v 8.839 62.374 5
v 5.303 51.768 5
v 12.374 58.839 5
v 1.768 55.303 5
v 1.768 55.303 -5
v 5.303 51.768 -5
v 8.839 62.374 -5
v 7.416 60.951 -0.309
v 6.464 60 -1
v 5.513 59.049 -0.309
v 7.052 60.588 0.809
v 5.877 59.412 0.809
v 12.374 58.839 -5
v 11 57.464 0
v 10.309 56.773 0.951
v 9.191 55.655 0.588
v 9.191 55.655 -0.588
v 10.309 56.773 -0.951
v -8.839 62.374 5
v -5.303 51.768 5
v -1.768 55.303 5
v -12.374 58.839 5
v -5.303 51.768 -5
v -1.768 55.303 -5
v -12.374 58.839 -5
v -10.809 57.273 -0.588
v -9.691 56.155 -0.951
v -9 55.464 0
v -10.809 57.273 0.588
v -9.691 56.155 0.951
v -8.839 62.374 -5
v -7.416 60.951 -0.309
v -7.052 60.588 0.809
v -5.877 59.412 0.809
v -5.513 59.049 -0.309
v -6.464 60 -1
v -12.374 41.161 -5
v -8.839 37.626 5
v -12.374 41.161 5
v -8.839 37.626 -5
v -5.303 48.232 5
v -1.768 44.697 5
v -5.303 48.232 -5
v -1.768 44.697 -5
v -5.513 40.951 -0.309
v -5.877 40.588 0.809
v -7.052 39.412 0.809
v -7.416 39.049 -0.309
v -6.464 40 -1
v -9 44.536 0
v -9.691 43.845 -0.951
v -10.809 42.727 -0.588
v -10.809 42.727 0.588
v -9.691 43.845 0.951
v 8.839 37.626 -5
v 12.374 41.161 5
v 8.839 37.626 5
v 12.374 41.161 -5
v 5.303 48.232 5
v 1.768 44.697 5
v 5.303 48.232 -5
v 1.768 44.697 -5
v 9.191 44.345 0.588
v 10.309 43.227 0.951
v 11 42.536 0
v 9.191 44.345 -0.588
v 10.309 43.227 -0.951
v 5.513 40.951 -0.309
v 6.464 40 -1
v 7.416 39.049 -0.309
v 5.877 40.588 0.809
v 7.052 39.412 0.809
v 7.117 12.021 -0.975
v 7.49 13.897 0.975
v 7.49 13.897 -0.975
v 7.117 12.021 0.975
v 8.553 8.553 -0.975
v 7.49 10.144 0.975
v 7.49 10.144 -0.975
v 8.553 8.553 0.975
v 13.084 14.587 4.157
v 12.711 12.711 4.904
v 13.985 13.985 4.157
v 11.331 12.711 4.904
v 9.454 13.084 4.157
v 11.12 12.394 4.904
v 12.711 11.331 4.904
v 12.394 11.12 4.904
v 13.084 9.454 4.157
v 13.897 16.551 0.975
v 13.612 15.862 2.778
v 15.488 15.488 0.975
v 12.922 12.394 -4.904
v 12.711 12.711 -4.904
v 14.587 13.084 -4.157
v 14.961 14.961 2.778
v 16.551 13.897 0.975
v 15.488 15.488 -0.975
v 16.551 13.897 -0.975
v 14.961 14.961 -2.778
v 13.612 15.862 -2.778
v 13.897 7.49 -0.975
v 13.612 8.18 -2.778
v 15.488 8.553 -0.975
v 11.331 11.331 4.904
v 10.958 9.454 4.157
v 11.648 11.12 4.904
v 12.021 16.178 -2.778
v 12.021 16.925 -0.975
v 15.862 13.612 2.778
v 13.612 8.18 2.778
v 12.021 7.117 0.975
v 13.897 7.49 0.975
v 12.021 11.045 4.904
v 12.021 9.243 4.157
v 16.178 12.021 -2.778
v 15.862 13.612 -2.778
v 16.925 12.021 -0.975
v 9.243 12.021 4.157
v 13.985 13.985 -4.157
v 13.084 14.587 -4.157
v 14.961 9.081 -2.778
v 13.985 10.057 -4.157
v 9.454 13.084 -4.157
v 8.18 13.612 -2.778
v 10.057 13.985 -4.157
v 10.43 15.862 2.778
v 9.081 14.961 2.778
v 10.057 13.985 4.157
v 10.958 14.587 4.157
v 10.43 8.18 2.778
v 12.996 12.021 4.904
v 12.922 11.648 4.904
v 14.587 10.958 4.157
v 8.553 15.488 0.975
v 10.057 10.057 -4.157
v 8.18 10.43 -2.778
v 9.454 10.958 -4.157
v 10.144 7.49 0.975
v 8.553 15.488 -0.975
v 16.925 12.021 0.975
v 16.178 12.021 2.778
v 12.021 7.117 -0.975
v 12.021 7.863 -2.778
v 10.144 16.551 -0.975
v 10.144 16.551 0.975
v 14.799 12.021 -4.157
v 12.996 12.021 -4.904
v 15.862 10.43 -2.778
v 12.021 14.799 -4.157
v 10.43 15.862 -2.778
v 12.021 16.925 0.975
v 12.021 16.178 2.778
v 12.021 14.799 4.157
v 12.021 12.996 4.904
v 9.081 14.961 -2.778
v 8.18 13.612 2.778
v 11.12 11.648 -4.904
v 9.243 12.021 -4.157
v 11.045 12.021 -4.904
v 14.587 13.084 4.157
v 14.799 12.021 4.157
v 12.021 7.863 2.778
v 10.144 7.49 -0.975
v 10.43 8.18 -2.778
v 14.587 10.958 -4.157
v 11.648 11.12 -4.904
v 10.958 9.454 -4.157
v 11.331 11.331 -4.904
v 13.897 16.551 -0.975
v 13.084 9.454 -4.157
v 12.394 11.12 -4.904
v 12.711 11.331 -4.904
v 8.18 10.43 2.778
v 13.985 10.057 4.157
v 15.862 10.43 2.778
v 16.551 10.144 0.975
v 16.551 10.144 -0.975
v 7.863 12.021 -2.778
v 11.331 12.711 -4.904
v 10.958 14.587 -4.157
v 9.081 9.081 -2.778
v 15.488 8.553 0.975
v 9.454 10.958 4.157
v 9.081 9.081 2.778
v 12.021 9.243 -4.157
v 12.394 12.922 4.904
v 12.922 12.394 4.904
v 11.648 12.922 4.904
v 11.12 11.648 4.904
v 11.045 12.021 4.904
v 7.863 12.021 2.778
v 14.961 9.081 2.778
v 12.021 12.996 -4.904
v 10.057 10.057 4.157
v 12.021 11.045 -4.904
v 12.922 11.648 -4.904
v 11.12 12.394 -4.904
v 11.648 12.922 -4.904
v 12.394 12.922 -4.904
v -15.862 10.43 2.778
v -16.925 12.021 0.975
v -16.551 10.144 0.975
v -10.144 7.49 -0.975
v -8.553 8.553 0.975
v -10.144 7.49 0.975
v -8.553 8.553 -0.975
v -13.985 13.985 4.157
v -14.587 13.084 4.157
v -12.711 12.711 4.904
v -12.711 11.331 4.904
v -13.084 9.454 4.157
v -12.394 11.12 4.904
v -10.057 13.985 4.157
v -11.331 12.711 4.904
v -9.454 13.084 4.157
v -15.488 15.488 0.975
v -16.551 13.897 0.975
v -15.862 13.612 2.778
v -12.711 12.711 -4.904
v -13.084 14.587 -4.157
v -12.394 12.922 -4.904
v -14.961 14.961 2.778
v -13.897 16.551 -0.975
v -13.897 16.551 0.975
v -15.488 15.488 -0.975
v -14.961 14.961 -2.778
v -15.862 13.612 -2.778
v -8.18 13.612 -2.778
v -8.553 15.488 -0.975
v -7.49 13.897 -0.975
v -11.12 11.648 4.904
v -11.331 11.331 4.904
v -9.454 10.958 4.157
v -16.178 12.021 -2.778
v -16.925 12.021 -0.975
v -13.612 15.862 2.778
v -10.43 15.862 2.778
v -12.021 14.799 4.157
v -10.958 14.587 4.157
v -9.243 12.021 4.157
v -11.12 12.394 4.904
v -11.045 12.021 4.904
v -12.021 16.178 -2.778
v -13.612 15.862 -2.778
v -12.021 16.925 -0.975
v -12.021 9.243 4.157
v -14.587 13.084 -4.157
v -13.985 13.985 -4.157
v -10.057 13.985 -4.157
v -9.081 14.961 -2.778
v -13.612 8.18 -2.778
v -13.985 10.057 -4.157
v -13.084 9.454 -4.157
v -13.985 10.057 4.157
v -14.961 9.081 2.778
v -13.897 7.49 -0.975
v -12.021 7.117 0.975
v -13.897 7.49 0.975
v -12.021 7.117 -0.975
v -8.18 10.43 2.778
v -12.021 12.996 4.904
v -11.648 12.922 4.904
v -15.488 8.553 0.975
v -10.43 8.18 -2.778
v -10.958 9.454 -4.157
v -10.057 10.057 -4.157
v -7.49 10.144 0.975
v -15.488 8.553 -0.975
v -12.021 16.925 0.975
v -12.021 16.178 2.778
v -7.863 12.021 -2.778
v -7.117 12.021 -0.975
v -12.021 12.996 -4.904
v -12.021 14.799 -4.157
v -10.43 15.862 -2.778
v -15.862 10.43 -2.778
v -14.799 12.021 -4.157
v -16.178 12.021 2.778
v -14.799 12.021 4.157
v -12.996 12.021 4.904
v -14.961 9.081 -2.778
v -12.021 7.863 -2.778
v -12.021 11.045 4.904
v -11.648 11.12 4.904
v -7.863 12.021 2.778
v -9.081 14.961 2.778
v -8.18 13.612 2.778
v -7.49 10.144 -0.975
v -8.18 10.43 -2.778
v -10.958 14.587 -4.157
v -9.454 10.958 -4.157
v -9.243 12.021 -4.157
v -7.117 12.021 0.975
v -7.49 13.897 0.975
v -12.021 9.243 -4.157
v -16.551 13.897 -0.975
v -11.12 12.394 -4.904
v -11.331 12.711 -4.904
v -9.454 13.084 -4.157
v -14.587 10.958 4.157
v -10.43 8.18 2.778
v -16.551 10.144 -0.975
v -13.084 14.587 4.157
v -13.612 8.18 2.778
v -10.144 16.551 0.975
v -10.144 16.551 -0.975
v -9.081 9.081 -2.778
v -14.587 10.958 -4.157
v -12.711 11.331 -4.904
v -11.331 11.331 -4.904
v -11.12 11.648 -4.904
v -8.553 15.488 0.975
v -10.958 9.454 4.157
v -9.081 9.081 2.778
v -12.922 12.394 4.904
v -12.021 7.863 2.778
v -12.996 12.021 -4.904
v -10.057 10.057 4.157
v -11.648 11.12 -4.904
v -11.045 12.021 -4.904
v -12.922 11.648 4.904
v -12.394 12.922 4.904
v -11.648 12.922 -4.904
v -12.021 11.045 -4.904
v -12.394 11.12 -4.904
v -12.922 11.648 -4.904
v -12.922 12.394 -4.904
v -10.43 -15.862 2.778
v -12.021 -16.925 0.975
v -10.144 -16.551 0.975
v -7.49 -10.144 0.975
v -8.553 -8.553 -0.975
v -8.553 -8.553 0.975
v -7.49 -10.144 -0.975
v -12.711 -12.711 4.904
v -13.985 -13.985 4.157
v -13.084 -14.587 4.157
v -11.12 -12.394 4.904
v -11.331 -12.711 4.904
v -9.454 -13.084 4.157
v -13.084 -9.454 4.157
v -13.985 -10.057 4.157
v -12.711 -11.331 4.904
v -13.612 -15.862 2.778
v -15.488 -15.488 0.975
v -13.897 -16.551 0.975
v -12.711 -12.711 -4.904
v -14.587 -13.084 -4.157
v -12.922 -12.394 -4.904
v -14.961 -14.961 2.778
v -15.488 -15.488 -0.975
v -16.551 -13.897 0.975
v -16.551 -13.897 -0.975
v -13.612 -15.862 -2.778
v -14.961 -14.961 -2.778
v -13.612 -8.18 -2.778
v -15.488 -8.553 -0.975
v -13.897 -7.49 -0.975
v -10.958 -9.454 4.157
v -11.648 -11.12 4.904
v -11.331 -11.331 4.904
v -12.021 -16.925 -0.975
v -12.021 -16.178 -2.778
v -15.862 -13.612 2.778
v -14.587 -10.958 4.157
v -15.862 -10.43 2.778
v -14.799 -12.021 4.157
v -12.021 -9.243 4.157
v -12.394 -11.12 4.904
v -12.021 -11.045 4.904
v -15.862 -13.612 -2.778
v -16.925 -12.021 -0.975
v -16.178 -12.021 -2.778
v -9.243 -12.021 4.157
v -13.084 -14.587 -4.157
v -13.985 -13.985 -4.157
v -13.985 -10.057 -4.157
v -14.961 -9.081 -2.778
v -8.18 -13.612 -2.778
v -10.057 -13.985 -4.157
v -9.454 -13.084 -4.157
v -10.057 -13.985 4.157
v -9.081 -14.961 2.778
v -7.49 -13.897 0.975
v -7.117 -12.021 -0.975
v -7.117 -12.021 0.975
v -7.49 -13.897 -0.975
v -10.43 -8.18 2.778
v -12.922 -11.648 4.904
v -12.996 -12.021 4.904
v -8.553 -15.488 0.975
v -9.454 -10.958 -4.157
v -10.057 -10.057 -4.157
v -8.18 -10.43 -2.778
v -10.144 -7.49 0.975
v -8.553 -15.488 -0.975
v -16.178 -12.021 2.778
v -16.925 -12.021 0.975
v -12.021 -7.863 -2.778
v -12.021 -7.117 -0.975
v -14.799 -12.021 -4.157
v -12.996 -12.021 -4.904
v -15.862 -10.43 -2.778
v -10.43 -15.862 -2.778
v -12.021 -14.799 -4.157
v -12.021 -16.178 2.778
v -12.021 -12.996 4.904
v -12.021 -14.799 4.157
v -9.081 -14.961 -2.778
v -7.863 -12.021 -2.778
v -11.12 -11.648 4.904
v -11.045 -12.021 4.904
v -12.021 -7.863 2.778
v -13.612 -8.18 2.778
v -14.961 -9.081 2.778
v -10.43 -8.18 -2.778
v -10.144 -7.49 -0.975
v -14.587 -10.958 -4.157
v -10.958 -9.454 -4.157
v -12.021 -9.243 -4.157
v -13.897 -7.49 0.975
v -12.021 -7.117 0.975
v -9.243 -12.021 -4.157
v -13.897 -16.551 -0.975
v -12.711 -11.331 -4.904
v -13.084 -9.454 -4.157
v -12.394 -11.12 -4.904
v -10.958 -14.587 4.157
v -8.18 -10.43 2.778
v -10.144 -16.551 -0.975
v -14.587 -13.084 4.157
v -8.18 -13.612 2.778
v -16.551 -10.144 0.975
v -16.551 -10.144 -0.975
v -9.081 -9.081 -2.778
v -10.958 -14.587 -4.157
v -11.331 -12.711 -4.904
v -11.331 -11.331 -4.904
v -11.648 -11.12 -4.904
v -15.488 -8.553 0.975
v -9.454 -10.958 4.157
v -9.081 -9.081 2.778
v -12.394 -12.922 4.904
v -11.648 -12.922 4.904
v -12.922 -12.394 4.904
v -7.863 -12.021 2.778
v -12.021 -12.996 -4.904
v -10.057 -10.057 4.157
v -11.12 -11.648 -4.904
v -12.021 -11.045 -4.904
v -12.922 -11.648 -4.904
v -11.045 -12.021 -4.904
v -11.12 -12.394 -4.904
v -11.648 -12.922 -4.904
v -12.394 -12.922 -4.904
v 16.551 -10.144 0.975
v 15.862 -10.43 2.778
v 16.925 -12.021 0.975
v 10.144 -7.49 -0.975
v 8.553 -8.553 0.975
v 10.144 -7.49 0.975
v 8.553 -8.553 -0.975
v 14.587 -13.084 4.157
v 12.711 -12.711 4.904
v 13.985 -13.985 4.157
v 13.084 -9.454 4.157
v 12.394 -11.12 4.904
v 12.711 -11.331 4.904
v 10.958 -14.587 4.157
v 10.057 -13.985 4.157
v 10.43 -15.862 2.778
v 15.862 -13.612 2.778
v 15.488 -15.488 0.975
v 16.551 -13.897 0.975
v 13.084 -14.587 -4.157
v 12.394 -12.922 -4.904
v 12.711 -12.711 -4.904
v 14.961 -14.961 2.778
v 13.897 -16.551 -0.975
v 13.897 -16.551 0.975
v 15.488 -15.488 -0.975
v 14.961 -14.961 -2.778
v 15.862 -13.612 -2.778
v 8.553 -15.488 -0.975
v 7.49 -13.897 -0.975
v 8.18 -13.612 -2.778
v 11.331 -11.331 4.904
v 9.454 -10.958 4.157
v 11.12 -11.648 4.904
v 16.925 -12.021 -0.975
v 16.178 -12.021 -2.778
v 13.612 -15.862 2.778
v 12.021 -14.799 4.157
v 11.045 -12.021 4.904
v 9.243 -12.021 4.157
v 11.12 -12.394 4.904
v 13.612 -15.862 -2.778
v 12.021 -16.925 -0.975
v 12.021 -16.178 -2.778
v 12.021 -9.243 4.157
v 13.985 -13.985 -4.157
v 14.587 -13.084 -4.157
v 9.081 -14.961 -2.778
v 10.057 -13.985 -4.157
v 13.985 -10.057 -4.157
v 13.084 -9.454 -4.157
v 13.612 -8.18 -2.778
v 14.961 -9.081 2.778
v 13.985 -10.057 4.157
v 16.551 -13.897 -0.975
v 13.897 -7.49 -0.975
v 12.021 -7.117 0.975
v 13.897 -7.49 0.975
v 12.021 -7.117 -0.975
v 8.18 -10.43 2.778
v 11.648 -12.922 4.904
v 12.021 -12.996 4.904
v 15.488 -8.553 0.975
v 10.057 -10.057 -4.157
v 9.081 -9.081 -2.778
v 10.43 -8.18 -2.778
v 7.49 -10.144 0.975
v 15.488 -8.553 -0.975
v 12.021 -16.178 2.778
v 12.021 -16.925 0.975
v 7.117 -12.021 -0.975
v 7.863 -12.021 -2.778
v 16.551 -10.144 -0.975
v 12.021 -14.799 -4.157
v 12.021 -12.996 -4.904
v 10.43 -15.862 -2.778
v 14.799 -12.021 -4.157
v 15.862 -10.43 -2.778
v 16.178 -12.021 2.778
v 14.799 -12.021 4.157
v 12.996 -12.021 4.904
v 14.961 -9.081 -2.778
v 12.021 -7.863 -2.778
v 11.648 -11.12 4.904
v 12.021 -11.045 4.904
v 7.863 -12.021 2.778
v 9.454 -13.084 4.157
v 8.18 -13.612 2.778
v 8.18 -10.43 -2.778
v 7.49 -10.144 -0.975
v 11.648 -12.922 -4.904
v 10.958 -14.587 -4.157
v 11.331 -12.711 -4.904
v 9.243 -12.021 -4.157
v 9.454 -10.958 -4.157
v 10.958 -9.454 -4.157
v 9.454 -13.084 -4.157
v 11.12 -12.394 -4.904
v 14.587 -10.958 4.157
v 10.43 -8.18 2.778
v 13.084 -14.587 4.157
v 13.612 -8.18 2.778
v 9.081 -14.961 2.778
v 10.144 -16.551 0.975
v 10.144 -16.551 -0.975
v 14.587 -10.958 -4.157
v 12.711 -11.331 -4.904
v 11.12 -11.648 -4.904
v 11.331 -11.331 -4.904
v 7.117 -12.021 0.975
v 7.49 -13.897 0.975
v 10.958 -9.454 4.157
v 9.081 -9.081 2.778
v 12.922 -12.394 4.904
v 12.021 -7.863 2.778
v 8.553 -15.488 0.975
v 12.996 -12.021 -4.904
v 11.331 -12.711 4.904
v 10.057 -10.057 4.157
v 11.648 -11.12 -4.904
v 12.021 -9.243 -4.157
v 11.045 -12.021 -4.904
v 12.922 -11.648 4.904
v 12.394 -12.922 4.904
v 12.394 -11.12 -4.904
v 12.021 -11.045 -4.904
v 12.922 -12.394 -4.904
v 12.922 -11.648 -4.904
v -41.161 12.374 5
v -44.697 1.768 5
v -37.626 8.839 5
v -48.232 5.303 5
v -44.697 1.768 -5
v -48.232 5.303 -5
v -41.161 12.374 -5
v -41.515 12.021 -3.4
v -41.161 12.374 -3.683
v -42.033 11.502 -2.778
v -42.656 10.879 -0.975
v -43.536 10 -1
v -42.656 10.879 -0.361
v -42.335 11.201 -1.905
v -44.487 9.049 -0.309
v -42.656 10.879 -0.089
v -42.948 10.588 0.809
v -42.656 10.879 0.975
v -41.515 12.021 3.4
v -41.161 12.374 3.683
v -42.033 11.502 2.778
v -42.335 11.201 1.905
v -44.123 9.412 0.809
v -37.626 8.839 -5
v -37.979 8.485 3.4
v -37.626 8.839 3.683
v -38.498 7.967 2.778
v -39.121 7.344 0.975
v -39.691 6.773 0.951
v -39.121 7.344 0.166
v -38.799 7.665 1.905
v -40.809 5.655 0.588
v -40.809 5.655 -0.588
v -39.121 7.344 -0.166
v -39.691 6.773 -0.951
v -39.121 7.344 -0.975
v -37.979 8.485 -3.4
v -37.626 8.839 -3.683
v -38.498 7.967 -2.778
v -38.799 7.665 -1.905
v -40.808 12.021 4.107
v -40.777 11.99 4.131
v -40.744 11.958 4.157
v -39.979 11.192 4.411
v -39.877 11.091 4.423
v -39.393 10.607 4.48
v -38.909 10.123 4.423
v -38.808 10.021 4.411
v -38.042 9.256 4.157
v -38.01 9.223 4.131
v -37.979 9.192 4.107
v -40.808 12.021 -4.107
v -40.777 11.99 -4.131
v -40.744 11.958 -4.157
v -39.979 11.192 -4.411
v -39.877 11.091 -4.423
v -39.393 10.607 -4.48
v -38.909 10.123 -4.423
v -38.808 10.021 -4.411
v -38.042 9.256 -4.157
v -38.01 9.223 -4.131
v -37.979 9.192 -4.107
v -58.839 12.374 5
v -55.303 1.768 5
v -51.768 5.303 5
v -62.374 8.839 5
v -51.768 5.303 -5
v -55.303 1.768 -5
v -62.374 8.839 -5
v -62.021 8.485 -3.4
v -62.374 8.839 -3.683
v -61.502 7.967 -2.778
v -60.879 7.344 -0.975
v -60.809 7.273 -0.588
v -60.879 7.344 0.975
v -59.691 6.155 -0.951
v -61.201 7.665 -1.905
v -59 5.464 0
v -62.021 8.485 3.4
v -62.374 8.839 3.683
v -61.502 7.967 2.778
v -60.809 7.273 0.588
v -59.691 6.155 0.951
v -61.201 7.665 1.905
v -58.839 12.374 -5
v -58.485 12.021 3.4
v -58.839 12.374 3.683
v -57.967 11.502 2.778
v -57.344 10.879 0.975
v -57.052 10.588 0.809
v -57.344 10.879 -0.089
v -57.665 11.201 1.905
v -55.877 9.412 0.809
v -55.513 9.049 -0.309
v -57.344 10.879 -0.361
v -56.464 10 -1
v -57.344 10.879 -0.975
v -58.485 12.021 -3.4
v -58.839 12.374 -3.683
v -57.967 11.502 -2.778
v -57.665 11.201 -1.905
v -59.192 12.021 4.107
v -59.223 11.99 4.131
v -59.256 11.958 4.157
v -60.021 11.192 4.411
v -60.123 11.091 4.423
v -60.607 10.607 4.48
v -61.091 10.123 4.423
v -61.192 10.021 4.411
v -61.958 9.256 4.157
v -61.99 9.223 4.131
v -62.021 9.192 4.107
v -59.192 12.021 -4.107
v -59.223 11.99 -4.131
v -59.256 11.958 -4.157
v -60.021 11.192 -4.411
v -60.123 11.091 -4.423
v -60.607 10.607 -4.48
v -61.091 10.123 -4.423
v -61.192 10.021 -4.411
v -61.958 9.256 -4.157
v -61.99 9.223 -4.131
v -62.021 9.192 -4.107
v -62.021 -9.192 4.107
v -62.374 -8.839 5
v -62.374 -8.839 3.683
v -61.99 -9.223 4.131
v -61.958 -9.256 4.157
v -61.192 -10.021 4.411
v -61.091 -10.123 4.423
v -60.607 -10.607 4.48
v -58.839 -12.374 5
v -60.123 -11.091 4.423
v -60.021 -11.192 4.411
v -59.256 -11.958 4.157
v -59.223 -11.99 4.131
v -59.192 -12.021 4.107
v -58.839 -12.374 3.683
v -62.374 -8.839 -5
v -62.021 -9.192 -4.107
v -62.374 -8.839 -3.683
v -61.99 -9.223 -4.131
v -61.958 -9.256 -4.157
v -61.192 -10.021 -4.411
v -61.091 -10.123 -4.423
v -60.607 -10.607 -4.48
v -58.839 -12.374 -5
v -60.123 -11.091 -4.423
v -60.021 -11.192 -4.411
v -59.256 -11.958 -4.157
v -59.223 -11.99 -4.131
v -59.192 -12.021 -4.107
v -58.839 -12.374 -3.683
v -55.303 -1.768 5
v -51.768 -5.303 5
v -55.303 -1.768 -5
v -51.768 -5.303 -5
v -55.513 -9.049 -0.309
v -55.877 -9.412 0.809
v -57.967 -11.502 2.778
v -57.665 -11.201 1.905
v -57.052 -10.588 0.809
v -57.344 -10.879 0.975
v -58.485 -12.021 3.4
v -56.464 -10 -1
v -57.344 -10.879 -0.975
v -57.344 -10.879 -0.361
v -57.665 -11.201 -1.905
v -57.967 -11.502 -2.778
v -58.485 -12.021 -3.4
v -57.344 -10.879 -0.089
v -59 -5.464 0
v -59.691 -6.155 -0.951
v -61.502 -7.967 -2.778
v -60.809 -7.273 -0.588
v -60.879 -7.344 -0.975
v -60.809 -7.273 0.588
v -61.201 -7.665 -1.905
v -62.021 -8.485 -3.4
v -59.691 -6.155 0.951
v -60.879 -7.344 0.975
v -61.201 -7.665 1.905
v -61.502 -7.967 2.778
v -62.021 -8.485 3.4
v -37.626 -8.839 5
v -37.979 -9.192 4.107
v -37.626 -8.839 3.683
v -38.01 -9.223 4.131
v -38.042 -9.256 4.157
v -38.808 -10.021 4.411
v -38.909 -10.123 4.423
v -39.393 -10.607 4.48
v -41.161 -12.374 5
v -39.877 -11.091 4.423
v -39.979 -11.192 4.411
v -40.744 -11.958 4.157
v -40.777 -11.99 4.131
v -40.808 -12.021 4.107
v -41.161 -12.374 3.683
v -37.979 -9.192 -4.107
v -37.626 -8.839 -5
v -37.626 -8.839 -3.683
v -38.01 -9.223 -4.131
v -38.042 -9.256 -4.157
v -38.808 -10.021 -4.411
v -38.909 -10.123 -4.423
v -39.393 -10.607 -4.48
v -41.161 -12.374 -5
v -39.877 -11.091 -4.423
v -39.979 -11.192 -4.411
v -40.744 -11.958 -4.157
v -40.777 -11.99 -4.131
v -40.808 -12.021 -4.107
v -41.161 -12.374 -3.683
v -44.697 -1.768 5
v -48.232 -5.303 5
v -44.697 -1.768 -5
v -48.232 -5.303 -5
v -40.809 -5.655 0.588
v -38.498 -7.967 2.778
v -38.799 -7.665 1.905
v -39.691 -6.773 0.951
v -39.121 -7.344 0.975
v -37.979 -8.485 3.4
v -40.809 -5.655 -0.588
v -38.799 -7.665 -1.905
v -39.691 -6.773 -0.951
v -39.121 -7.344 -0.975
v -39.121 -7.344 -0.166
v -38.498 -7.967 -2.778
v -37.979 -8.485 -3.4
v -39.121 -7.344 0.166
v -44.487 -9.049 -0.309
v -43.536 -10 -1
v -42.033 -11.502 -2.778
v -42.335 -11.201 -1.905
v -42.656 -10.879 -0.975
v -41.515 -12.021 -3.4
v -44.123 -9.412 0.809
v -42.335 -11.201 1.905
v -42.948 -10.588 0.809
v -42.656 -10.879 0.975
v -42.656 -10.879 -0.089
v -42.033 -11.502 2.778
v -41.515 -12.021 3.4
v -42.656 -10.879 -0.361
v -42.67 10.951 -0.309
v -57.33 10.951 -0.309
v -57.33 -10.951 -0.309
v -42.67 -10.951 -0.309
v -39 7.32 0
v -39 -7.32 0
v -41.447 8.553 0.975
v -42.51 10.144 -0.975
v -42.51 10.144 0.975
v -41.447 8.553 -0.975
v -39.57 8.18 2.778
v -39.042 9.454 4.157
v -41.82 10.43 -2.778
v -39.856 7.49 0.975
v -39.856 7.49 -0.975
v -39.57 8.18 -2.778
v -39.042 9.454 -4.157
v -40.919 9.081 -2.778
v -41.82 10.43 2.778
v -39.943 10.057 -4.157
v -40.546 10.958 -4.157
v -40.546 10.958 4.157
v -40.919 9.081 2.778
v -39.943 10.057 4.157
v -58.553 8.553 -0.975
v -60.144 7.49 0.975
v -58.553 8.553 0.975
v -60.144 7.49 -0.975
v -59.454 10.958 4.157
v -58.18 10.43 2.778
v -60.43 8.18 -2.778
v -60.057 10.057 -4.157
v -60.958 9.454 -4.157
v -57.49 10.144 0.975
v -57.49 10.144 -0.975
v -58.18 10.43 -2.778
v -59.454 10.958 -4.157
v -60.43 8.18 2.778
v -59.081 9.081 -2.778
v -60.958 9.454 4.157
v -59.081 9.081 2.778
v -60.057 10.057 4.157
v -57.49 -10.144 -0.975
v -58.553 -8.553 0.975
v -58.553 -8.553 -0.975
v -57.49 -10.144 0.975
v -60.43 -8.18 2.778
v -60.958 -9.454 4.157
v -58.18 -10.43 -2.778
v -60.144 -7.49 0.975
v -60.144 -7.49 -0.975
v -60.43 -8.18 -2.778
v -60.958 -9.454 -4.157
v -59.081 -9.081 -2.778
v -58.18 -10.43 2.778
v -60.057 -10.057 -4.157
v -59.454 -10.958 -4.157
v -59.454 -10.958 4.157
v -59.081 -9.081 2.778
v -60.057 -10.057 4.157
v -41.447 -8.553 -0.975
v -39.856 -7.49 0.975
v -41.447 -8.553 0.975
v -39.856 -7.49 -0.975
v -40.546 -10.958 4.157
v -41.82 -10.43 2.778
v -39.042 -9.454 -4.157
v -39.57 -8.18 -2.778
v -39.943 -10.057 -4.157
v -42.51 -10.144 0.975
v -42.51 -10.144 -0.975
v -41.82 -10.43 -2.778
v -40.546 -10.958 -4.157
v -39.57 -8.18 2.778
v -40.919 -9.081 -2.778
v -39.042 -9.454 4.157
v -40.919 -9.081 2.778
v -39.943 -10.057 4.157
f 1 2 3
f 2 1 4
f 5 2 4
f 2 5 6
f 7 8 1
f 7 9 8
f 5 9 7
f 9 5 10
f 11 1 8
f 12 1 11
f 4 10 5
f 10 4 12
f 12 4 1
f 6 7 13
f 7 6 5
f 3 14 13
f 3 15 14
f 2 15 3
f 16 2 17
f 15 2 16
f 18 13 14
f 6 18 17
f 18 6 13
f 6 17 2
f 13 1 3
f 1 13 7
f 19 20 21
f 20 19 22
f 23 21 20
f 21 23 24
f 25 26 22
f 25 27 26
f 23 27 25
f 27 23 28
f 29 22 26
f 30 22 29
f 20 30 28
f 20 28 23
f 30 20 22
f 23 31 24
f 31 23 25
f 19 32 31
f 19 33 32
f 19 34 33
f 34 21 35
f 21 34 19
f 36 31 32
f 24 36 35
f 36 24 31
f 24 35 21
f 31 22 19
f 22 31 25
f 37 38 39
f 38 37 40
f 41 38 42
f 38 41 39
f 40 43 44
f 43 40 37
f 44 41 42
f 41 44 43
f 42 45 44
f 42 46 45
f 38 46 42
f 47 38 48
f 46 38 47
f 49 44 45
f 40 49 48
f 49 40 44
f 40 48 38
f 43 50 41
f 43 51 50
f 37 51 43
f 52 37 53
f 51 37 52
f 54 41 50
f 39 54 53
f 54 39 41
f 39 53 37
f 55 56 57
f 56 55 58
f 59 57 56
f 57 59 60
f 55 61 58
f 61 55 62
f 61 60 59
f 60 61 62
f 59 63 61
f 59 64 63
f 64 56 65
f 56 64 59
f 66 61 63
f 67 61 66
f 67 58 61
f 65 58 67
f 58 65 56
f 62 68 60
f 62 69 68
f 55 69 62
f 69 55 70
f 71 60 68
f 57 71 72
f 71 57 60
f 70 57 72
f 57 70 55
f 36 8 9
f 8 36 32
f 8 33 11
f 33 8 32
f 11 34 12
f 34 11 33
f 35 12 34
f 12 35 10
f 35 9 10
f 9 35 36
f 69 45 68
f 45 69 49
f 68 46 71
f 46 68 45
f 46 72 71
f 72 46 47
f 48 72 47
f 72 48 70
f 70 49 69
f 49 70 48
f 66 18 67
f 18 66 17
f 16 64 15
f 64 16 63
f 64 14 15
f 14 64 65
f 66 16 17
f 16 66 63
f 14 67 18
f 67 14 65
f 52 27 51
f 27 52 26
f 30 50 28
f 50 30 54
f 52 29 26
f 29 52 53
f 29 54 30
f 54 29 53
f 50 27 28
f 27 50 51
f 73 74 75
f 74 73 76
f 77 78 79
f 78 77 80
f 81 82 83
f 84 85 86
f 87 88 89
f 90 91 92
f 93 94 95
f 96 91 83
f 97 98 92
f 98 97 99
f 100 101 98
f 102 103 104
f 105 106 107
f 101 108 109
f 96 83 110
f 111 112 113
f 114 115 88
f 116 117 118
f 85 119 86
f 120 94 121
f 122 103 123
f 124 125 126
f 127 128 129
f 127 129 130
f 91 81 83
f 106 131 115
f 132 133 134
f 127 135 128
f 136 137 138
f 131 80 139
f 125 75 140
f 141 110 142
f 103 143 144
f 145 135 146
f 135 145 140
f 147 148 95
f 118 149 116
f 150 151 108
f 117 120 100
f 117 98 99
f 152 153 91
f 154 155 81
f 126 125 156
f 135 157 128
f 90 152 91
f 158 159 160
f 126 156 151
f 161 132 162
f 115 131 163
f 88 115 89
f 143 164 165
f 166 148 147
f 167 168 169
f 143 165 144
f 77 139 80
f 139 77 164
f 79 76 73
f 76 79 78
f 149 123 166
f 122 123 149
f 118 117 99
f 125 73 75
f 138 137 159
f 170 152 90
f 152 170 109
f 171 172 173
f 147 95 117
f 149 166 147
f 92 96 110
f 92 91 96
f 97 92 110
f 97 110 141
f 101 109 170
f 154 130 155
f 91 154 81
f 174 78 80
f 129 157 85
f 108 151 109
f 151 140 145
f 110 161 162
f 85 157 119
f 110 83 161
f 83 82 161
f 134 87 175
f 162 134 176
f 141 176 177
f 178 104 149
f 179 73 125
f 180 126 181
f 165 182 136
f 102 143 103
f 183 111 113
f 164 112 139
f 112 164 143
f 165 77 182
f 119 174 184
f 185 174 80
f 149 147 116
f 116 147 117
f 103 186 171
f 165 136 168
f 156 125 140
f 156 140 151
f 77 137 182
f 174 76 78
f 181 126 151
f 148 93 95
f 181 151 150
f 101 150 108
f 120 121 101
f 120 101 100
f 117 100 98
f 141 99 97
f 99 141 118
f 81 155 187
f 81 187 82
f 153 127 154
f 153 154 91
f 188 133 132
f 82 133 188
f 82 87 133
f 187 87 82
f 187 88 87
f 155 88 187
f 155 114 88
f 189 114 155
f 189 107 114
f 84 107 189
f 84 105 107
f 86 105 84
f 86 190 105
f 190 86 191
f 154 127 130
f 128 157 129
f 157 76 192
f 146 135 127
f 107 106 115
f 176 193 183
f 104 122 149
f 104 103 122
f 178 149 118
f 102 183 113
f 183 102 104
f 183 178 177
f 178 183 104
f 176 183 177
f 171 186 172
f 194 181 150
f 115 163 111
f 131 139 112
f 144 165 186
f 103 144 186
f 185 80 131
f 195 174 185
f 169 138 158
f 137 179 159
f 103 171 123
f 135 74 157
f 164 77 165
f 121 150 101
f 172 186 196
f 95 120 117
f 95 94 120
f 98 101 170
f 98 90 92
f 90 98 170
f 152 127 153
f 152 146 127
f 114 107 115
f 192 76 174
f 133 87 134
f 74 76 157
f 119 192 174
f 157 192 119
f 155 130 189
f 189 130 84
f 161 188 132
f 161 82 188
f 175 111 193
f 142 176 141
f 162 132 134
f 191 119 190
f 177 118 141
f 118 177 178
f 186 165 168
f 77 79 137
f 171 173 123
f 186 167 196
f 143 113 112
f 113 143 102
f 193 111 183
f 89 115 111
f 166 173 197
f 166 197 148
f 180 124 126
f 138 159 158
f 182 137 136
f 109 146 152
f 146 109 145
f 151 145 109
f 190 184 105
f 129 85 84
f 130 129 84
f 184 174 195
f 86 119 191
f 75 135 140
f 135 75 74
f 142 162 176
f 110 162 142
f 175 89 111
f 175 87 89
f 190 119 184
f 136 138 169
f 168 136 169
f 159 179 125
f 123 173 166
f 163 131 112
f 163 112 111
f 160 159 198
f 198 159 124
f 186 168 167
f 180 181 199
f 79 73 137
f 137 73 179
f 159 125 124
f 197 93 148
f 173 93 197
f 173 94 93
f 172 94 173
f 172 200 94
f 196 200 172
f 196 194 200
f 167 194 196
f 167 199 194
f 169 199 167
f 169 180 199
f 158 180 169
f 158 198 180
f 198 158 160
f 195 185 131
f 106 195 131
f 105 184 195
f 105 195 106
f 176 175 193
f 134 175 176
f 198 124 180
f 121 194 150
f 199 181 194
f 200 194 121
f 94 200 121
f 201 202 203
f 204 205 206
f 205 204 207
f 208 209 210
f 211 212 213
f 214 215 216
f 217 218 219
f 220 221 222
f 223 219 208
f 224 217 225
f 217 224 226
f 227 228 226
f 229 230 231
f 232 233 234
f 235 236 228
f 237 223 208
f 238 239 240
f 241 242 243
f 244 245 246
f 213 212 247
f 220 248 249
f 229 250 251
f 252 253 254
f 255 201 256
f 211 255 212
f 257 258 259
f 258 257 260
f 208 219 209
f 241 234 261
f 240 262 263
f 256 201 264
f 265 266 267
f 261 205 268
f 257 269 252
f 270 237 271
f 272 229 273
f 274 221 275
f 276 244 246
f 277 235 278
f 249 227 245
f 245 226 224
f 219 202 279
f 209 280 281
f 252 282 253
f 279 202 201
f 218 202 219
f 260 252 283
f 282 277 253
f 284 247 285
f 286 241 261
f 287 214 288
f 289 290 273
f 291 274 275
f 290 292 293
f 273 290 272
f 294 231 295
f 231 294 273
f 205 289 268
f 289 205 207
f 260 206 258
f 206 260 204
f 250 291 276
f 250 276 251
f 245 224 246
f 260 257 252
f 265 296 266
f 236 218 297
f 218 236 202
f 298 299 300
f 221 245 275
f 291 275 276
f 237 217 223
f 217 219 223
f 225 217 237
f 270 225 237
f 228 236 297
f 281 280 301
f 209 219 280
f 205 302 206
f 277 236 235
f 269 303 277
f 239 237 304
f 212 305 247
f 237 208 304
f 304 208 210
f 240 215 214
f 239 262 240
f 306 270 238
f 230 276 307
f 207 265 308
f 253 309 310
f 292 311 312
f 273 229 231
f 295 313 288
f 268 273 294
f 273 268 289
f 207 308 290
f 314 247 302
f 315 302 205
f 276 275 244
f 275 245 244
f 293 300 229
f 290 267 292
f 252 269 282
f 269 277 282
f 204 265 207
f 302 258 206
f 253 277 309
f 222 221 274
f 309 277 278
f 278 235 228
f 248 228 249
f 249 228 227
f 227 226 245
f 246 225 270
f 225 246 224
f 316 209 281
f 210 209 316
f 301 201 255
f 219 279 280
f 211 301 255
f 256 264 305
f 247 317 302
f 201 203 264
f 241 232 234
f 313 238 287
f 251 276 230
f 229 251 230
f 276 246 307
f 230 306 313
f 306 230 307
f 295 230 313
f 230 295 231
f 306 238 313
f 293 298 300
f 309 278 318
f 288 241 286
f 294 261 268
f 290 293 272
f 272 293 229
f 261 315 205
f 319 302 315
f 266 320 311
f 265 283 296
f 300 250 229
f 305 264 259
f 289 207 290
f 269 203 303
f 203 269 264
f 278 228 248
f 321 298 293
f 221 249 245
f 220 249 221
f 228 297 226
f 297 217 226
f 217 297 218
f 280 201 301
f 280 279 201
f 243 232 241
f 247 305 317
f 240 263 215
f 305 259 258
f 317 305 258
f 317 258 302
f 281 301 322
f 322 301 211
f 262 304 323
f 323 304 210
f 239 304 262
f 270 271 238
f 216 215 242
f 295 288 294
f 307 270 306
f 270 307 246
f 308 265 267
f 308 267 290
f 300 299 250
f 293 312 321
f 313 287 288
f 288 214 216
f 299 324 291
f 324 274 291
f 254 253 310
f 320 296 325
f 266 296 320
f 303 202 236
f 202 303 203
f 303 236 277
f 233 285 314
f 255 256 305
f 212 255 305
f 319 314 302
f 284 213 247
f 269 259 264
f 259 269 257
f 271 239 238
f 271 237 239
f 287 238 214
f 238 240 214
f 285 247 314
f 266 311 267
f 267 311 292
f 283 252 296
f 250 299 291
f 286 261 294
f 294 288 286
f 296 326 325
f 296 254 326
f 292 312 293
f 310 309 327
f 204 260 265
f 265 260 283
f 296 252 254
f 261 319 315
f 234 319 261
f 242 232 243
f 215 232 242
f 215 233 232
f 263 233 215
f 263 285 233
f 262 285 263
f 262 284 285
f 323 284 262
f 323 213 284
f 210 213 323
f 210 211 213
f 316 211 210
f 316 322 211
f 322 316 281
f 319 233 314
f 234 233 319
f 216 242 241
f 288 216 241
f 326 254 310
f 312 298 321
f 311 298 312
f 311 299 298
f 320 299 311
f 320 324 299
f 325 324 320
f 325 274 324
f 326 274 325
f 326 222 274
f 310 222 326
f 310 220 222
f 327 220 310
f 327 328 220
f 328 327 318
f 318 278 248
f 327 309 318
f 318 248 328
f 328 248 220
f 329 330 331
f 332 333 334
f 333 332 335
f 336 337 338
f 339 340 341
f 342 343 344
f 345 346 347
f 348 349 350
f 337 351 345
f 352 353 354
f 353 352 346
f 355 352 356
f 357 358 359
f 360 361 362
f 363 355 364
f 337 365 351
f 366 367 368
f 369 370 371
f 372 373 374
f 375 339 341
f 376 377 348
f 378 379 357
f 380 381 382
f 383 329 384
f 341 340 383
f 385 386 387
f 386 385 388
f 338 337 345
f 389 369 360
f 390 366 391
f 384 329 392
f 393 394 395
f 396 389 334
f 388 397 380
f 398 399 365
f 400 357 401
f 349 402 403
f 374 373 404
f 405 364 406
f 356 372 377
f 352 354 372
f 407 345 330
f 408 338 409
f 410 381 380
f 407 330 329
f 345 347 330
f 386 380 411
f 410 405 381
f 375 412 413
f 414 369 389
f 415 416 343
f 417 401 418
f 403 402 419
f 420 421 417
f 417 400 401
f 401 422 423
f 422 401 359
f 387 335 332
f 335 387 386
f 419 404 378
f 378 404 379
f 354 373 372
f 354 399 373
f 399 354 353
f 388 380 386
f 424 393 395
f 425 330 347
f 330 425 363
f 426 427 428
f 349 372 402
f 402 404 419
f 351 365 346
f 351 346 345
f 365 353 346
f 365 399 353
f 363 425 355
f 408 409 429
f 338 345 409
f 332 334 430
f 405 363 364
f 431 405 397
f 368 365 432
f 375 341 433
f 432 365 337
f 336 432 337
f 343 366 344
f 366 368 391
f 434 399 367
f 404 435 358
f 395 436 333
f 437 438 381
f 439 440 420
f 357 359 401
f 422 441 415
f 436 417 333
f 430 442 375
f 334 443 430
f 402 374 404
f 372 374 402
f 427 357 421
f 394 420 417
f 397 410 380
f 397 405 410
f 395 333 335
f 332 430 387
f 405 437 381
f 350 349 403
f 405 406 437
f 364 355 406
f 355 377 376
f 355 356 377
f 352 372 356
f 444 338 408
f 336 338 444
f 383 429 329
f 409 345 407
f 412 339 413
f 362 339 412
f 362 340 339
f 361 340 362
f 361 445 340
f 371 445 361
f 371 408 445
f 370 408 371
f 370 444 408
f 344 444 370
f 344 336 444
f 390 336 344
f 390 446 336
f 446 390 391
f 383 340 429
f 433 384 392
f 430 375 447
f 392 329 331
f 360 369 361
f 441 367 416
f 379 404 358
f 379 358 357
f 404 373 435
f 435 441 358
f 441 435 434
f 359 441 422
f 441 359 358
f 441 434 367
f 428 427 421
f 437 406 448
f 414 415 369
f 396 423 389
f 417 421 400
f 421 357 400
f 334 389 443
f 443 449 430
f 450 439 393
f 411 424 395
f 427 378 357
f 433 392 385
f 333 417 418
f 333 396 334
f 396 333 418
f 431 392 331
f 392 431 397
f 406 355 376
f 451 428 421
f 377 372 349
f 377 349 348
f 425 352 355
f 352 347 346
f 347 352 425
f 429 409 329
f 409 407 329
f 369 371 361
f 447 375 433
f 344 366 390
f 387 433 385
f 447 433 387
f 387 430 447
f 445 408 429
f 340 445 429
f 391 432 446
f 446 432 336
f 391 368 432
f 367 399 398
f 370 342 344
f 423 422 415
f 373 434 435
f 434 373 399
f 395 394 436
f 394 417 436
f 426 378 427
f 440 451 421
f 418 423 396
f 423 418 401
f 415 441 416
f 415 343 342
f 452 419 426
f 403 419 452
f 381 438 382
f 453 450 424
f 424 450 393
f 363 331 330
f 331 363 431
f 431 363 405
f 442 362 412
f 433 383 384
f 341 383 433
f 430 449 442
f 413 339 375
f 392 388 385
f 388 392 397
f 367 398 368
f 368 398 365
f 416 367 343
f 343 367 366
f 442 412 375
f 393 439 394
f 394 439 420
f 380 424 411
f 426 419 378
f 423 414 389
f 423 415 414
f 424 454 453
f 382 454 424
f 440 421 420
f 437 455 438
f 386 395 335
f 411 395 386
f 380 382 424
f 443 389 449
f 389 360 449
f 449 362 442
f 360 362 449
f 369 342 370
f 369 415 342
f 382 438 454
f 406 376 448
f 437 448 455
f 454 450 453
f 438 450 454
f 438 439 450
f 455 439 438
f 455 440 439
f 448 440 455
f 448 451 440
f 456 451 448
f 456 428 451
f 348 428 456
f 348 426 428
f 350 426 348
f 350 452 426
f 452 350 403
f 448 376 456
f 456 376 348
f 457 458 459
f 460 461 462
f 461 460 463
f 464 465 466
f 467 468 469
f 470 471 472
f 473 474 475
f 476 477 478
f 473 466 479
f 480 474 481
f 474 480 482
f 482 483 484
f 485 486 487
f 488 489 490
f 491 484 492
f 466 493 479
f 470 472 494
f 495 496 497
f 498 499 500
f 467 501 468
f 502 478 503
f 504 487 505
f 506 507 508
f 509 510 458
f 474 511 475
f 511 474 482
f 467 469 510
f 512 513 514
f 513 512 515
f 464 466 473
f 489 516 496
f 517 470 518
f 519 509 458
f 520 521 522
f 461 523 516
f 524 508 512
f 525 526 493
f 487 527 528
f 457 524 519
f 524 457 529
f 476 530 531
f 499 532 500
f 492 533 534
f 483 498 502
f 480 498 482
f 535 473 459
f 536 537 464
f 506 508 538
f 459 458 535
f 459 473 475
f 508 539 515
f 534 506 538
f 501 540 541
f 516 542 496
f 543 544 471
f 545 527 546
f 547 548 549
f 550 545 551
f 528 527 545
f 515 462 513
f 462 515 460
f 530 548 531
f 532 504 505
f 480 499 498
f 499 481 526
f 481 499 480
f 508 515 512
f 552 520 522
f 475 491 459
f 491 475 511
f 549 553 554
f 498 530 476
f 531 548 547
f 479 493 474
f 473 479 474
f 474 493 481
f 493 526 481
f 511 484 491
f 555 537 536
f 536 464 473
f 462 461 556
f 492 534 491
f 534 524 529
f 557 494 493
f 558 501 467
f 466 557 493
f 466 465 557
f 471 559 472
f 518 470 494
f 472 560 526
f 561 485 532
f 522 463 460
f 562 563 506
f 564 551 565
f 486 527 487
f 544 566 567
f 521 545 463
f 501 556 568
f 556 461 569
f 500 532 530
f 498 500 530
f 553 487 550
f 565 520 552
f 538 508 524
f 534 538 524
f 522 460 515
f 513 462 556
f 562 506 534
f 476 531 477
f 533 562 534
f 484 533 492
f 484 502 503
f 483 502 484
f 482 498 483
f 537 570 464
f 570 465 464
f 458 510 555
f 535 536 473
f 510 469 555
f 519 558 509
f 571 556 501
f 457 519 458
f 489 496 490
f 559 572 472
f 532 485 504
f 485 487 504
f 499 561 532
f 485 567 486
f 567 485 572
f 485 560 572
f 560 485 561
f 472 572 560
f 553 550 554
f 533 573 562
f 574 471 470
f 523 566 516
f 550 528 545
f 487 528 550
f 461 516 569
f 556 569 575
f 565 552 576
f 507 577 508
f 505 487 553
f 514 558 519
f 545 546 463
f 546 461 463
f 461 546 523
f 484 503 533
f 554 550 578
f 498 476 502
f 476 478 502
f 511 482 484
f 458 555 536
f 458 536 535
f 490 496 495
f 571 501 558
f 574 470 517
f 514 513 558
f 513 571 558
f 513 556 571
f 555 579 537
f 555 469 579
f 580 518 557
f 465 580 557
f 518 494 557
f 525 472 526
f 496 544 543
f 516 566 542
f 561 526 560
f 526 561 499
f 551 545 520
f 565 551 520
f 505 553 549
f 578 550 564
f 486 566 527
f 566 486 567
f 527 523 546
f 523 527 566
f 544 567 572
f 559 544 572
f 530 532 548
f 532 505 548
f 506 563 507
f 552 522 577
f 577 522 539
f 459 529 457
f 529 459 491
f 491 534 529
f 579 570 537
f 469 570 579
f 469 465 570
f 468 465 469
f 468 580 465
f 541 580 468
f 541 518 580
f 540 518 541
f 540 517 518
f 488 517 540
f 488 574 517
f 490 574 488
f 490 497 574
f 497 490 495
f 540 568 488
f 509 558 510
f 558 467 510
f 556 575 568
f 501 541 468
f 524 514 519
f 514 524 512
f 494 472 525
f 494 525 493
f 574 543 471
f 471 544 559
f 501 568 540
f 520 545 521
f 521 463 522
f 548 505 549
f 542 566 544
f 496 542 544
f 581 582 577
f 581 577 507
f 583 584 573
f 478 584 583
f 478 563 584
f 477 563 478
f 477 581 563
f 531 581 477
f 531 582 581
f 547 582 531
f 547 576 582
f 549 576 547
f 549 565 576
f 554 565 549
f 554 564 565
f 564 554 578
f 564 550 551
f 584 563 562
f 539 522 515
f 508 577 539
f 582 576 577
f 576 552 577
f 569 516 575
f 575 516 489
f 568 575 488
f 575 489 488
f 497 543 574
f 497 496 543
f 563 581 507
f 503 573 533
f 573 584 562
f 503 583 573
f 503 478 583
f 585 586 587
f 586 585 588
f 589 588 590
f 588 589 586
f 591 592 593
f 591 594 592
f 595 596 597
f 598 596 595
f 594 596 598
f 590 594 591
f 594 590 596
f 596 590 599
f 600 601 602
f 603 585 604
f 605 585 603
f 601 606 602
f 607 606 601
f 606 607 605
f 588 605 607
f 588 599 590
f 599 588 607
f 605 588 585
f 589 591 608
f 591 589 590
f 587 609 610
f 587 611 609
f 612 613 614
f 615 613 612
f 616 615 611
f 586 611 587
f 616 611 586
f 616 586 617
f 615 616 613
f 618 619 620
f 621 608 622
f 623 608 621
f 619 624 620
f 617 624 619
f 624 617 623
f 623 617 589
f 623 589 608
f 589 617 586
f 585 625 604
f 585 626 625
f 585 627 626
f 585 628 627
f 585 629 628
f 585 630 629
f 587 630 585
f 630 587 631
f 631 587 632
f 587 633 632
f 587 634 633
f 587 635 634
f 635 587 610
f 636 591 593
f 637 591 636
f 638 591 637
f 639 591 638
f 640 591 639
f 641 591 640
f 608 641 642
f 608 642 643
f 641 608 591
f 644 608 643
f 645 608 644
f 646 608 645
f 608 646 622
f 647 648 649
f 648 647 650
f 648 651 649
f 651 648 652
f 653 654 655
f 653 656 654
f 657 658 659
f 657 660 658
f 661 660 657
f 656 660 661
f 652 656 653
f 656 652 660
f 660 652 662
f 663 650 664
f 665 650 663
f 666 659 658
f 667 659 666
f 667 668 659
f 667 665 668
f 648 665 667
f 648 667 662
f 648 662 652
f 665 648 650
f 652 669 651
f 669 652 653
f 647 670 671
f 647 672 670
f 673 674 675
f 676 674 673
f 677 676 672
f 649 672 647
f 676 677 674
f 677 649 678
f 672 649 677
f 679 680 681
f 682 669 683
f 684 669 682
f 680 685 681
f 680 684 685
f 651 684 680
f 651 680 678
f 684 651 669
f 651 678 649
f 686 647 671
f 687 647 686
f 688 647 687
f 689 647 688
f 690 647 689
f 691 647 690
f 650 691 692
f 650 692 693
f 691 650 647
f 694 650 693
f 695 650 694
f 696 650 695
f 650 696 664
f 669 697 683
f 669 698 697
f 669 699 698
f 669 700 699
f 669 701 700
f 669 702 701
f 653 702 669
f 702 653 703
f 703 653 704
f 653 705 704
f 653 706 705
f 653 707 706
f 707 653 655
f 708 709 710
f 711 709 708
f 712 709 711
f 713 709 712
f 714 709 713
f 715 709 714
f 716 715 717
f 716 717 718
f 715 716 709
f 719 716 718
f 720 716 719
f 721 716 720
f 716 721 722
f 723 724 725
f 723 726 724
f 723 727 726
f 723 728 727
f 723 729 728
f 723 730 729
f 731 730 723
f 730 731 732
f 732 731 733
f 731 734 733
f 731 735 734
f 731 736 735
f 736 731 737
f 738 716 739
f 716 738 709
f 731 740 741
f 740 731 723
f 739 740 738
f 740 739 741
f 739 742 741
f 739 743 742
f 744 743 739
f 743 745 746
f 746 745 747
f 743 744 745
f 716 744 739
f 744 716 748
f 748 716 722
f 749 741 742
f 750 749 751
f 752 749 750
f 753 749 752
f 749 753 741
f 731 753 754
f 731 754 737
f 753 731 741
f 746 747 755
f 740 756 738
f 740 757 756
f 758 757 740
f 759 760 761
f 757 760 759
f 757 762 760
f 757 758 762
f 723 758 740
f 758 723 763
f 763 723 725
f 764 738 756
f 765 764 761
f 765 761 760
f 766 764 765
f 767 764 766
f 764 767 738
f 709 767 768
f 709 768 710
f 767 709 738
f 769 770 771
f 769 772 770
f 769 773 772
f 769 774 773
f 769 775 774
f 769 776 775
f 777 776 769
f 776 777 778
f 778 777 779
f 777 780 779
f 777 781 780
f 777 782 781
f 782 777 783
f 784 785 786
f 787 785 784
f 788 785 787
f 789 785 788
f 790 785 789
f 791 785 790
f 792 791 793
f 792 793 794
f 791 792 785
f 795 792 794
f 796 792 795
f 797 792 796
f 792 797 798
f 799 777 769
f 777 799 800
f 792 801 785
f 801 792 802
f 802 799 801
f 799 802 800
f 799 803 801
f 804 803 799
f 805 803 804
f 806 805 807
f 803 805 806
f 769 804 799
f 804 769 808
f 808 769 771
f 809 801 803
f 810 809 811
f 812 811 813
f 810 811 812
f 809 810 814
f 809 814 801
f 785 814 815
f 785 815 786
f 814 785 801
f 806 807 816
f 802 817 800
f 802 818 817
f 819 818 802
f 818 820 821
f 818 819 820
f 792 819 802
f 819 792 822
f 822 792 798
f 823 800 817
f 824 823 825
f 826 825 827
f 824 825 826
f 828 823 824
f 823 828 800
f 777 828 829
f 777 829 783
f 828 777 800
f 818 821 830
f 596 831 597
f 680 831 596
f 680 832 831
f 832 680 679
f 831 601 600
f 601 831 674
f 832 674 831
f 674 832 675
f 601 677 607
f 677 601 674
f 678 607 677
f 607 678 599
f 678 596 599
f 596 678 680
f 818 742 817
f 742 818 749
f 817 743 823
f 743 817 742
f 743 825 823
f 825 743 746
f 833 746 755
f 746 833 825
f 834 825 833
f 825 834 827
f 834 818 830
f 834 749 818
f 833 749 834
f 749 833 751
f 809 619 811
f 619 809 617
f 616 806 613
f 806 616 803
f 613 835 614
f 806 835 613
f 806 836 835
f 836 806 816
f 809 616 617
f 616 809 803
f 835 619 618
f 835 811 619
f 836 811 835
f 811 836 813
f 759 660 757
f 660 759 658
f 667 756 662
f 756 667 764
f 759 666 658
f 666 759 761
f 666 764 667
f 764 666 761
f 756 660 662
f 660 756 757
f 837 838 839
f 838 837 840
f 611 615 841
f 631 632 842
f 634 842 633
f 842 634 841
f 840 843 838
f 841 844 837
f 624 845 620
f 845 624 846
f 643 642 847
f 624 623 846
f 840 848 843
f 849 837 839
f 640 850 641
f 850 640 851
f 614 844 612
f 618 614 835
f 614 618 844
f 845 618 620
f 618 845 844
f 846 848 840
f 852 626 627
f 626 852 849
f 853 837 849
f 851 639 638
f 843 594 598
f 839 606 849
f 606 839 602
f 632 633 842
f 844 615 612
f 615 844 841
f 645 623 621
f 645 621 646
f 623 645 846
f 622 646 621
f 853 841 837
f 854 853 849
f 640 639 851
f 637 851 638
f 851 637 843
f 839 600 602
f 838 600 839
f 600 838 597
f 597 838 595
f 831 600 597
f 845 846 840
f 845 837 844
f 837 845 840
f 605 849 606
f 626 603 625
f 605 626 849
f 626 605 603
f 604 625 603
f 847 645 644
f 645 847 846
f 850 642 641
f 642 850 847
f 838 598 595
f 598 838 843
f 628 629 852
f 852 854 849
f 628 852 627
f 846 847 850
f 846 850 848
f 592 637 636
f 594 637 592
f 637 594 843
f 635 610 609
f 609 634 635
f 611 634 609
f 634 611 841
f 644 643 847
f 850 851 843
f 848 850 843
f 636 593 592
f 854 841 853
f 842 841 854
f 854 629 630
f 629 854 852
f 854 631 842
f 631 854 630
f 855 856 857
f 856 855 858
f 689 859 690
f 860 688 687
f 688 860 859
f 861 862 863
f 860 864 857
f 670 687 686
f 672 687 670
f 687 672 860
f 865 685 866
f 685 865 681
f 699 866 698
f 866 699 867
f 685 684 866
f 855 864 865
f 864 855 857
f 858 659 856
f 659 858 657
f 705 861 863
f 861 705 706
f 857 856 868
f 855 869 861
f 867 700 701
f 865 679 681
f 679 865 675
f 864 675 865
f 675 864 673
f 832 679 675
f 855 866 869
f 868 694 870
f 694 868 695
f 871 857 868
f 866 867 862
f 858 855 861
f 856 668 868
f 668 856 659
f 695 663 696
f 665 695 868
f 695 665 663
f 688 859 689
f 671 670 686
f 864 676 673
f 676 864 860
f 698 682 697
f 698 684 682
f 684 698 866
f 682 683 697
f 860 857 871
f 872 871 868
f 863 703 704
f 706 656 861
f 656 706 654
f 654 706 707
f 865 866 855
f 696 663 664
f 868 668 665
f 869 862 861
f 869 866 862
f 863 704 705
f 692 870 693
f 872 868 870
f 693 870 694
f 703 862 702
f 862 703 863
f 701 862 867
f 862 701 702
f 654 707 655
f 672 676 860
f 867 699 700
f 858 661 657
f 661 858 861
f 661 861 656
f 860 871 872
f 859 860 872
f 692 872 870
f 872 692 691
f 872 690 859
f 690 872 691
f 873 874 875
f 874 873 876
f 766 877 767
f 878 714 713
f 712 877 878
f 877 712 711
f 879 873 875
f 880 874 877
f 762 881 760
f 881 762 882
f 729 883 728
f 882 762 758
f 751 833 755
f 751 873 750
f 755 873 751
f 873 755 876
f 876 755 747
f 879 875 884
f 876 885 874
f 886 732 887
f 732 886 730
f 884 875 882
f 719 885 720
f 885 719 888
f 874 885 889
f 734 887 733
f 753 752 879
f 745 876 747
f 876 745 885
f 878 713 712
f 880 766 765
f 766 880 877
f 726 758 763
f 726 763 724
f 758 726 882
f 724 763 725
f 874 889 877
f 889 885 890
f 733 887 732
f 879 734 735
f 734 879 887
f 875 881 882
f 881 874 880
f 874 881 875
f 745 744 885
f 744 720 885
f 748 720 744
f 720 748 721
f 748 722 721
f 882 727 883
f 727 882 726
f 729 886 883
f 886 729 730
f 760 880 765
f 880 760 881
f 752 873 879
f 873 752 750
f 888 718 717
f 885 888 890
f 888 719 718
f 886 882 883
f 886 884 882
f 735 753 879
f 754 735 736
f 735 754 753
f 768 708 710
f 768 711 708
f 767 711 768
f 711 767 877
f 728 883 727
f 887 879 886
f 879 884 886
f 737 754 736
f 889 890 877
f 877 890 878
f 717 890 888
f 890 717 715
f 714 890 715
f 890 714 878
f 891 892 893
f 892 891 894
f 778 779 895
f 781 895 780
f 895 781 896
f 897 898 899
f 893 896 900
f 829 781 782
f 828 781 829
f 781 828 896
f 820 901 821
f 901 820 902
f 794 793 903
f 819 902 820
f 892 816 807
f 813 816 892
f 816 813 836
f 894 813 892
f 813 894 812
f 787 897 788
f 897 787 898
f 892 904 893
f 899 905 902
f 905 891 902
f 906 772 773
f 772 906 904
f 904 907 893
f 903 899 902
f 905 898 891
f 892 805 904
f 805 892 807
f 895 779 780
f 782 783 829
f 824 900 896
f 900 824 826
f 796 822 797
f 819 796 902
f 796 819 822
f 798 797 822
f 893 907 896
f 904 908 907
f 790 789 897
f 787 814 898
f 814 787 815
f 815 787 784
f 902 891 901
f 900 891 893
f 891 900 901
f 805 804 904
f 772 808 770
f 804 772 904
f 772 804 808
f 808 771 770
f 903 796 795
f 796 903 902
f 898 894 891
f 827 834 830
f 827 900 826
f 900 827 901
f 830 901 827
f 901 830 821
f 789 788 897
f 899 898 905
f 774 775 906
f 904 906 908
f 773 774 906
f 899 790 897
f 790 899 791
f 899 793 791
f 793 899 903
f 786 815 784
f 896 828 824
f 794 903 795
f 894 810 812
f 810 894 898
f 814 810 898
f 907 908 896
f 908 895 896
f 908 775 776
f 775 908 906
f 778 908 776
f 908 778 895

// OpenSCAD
b=10;
h=5;
a=10;
radio=5;
resta=1;

// **************ENSAMBLE*****************

translate([0,50,0])
union(){
    //Figura1
rotate(45)
translate([b,0,0])
cube([b,h,10],center=true);

    //Figura2
rotate(135)
translate([b,0,0])
cube([b,h,10],center=true);
    
    //Figura3
rotate(225)
translate([b,0,0])
cube([b,h,10],center=true);

    //Figura4
rotate(315)
translate([b,0,0])
cube([b,h,10],center=true);

    //Union1
translate([0,b,0])
rotate([0,90,0])
cylinder(r=1,Sfn=5,h=2*b,center=true);

    //Union2
translate([0,-b,0])
rotate([0,90,0])
cylinder(r=1,Sfn=5,h=2*b,center=true);

    //Union3
translate([b,0,0])
rotate([90,0,0])
cylinder(r=1,Sfn=5,h=2*b,center=true);

    //Union4
translate([-b,0,0])
rotate([90,0,0])
cylinder(r=1,Sfn=5,h=2*b,center=true);
}

// ***********TALADRO******************
union(){
//Esfera1
rotate(45)
translate([(1.5*b)+(radio-3),0,0])
sphere(r=radio,Sfn=50);

//Esfera2
rotate(135)
translate([(1.5*b)+(radio-3),0,0])
sphere(r=radio,Sfn=50);

//Esfera3
rotate(225)
translate([(1.5*b)+(radio-3),0,0])
sphere(r=radio,Sfn=50);

//Esfera4
rotate(315)
translate([(1.5*b)+(radio-3),0,0])
sphere(r=radio,Sfn=50);
}
//*************************************
//**************CORTE******************
//*************************************

translate([-50,0,0])
difference(){
// **************ENSAMBLE*****************
union(){
    //Figura1
rotate(45)
translate([b,0,0])
cube([b,h,10],center=true);

    //Figura2
rotate(135)
translate([b,0,0])
cube([b,h,10],center=true);
    
    //Figura3
rotate(225)
translate([b,0,0])
cube([b,h,10],center=true);

    //Figura4
rotate(315)
translate([b,0,0])
cube([b,h,10],center=true);

    //Union1
translate([0,b,0])
rotate([0,90,0])
cylinder(r=1,Sfn=5,h=2*b,center=true);

    //Union2
translate([0,-b,0])
rotate([0,90,0])
cylinder(r=1,Sfn=5,h=2*b,center=true);

    //Union3
translate([b,0,0])
rotate([90,0,0])
cylinder(r=1,Sfn=5,h=2*b,center=true);

    //Union4
translate([-b,0,0])
rotate([90,0,0])
cylinder(r=1,Sfn=5,h=2*b,center=true);
}

// ***********TALADRO******************
union(){
//Esfera1
rotate(45)
translate([(1.5*b)+(radio-3),0,0])
sphere(r=radio,Sfn=50);

//Esfera2
rotate(135)
translate([(1.5*b)+(radio-3),0,0])
sphere(r=radio,Sfn=50);

//Esfera3
rotate(225)
translate([(1.5*b)+(radio-3),0,0])
sphere(r=radio,Sfn=50);

//Esfera4
rotate(315)
translate([(1.5*b)+(radio-3),0,0])
sphere(r=radio,Sfn=50);
}
}
